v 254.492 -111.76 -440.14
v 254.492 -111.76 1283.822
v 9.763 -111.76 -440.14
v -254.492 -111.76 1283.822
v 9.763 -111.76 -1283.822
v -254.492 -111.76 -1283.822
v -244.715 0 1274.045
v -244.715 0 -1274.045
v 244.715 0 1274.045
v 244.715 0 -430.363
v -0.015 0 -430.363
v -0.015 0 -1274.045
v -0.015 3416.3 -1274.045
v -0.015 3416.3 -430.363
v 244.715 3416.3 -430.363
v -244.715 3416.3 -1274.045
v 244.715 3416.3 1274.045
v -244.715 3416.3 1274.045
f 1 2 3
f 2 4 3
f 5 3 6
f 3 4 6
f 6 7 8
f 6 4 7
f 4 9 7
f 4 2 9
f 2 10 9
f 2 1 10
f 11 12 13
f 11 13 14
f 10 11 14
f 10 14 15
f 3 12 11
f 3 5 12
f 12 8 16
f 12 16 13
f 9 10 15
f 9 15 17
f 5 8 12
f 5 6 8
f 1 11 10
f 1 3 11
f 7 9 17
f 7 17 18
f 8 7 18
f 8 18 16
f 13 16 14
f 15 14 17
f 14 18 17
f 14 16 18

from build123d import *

# Parameters (mm, degrees)
F1_DEPTH      = 3416.3
F1_DEPTH_BACK = 111.76
F1_TAPER_BACK = -5


with BuildPart() as f1:
    # F0 (on Front) → F1 (new body, two sides)
    with BuildSketch(Plane.XZ) as f1_sk:
        Polygon((244.7146998, 1274.0445944), (-244.7146744, 1274.0445944), (-244.7146744, -1274.0446198), (-0.0151384, -1274.0446198), (-0.0151384, -430.3626394), (244.7146998, -430.3626394), align=None)
    extrude(amount=-F1_DEPTH)
    extrude(f1_sk.sketch, amount=F1_DEPTH_BACK, taper=F1_TAPER_BACK)


solid = f1.part
